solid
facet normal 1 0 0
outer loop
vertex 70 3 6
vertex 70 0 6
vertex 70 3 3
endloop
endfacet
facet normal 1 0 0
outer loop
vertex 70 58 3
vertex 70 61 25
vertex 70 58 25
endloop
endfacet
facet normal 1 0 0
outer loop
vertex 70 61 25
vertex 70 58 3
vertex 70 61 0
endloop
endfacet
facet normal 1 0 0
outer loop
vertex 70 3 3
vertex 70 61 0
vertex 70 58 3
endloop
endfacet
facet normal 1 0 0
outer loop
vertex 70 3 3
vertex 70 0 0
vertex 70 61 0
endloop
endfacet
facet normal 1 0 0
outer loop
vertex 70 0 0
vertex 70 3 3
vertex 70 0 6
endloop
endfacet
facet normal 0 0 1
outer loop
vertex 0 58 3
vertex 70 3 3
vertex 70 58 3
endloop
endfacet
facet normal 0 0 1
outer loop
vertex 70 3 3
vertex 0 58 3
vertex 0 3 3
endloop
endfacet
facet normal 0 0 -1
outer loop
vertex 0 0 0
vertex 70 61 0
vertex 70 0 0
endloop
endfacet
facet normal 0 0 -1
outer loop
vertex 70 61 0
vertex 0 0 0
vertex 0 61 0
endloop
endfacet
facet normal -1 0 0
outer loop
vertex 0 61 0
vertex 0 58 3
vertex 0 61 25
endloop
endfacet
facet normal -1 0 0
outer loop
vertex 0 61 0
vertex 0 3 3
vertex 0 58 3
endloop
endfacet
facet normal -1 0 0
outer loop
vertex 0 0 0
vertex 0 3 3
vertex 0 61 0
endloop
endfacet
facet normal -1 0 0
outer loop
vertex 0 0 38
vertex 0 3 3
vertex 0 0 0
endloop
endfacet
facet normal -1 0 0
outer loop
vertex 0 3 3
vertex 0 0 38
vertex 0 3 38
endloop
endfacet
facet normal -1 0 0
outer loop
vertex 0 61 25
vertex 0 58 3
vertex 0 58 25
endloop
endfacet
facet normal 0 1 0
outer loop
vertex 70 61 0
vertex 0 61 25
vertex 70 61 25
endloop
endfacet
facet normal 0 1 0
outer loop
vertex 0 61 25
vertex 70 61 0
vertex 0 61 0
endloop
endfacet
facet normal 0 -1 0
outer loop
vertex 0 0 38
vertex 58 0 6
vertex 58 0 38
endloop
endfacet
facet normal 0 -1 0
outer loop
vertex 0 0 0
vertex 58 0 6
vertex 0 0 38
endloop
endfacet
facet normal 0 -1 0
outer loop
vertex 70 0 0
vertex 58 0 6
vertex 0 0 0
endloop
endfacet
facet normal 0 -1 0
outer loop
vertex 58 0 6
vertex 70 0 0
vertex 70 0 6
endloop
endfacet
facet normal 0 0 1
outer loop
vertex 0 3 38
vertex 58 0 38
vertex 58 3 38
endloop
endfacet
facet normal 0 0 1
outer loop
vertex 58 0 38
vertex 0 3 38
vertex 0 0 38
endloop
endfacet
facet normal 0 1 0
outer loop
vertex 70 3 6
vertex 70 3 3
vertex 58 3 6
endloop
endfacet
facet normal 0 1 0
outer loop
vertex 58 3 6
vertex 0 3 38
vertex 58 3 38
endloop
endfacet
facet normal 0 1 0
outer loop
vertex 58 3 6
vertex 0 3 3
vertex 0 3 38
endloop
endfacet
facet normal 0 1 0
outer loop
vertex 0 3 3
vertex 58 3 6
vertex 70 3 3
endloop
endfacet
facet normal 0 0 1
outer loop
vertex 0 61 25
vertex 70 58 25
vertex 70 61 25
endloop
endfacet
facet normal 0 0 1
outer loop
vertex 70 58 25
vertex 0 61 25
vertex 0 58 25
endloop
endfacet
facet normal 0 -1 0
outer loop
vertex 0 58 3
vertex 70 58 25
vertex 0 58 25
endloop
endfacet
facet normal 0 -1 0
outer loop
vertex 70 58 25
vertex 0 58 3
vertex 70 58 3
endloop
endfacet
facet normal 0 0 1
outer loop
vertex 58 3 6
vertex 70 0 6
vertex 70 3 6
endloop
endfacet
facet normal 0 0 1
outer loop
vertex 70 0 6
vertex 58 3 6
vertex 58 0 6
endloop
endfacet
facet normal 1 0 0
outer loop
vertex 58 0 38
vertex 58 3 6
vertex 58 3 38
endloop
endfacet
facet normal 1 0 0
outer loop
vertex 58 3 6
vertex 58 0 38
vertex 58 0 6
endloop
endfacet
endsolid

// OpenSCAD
difference(){
	union(){
		cube([70,61,3]);
		cube([70,3,38]);
		translate([0,58,0]) cube([70,3,25]);
	}
	union(){
		translate([58,0,6]) cube([12,3,32]);
	}
}
